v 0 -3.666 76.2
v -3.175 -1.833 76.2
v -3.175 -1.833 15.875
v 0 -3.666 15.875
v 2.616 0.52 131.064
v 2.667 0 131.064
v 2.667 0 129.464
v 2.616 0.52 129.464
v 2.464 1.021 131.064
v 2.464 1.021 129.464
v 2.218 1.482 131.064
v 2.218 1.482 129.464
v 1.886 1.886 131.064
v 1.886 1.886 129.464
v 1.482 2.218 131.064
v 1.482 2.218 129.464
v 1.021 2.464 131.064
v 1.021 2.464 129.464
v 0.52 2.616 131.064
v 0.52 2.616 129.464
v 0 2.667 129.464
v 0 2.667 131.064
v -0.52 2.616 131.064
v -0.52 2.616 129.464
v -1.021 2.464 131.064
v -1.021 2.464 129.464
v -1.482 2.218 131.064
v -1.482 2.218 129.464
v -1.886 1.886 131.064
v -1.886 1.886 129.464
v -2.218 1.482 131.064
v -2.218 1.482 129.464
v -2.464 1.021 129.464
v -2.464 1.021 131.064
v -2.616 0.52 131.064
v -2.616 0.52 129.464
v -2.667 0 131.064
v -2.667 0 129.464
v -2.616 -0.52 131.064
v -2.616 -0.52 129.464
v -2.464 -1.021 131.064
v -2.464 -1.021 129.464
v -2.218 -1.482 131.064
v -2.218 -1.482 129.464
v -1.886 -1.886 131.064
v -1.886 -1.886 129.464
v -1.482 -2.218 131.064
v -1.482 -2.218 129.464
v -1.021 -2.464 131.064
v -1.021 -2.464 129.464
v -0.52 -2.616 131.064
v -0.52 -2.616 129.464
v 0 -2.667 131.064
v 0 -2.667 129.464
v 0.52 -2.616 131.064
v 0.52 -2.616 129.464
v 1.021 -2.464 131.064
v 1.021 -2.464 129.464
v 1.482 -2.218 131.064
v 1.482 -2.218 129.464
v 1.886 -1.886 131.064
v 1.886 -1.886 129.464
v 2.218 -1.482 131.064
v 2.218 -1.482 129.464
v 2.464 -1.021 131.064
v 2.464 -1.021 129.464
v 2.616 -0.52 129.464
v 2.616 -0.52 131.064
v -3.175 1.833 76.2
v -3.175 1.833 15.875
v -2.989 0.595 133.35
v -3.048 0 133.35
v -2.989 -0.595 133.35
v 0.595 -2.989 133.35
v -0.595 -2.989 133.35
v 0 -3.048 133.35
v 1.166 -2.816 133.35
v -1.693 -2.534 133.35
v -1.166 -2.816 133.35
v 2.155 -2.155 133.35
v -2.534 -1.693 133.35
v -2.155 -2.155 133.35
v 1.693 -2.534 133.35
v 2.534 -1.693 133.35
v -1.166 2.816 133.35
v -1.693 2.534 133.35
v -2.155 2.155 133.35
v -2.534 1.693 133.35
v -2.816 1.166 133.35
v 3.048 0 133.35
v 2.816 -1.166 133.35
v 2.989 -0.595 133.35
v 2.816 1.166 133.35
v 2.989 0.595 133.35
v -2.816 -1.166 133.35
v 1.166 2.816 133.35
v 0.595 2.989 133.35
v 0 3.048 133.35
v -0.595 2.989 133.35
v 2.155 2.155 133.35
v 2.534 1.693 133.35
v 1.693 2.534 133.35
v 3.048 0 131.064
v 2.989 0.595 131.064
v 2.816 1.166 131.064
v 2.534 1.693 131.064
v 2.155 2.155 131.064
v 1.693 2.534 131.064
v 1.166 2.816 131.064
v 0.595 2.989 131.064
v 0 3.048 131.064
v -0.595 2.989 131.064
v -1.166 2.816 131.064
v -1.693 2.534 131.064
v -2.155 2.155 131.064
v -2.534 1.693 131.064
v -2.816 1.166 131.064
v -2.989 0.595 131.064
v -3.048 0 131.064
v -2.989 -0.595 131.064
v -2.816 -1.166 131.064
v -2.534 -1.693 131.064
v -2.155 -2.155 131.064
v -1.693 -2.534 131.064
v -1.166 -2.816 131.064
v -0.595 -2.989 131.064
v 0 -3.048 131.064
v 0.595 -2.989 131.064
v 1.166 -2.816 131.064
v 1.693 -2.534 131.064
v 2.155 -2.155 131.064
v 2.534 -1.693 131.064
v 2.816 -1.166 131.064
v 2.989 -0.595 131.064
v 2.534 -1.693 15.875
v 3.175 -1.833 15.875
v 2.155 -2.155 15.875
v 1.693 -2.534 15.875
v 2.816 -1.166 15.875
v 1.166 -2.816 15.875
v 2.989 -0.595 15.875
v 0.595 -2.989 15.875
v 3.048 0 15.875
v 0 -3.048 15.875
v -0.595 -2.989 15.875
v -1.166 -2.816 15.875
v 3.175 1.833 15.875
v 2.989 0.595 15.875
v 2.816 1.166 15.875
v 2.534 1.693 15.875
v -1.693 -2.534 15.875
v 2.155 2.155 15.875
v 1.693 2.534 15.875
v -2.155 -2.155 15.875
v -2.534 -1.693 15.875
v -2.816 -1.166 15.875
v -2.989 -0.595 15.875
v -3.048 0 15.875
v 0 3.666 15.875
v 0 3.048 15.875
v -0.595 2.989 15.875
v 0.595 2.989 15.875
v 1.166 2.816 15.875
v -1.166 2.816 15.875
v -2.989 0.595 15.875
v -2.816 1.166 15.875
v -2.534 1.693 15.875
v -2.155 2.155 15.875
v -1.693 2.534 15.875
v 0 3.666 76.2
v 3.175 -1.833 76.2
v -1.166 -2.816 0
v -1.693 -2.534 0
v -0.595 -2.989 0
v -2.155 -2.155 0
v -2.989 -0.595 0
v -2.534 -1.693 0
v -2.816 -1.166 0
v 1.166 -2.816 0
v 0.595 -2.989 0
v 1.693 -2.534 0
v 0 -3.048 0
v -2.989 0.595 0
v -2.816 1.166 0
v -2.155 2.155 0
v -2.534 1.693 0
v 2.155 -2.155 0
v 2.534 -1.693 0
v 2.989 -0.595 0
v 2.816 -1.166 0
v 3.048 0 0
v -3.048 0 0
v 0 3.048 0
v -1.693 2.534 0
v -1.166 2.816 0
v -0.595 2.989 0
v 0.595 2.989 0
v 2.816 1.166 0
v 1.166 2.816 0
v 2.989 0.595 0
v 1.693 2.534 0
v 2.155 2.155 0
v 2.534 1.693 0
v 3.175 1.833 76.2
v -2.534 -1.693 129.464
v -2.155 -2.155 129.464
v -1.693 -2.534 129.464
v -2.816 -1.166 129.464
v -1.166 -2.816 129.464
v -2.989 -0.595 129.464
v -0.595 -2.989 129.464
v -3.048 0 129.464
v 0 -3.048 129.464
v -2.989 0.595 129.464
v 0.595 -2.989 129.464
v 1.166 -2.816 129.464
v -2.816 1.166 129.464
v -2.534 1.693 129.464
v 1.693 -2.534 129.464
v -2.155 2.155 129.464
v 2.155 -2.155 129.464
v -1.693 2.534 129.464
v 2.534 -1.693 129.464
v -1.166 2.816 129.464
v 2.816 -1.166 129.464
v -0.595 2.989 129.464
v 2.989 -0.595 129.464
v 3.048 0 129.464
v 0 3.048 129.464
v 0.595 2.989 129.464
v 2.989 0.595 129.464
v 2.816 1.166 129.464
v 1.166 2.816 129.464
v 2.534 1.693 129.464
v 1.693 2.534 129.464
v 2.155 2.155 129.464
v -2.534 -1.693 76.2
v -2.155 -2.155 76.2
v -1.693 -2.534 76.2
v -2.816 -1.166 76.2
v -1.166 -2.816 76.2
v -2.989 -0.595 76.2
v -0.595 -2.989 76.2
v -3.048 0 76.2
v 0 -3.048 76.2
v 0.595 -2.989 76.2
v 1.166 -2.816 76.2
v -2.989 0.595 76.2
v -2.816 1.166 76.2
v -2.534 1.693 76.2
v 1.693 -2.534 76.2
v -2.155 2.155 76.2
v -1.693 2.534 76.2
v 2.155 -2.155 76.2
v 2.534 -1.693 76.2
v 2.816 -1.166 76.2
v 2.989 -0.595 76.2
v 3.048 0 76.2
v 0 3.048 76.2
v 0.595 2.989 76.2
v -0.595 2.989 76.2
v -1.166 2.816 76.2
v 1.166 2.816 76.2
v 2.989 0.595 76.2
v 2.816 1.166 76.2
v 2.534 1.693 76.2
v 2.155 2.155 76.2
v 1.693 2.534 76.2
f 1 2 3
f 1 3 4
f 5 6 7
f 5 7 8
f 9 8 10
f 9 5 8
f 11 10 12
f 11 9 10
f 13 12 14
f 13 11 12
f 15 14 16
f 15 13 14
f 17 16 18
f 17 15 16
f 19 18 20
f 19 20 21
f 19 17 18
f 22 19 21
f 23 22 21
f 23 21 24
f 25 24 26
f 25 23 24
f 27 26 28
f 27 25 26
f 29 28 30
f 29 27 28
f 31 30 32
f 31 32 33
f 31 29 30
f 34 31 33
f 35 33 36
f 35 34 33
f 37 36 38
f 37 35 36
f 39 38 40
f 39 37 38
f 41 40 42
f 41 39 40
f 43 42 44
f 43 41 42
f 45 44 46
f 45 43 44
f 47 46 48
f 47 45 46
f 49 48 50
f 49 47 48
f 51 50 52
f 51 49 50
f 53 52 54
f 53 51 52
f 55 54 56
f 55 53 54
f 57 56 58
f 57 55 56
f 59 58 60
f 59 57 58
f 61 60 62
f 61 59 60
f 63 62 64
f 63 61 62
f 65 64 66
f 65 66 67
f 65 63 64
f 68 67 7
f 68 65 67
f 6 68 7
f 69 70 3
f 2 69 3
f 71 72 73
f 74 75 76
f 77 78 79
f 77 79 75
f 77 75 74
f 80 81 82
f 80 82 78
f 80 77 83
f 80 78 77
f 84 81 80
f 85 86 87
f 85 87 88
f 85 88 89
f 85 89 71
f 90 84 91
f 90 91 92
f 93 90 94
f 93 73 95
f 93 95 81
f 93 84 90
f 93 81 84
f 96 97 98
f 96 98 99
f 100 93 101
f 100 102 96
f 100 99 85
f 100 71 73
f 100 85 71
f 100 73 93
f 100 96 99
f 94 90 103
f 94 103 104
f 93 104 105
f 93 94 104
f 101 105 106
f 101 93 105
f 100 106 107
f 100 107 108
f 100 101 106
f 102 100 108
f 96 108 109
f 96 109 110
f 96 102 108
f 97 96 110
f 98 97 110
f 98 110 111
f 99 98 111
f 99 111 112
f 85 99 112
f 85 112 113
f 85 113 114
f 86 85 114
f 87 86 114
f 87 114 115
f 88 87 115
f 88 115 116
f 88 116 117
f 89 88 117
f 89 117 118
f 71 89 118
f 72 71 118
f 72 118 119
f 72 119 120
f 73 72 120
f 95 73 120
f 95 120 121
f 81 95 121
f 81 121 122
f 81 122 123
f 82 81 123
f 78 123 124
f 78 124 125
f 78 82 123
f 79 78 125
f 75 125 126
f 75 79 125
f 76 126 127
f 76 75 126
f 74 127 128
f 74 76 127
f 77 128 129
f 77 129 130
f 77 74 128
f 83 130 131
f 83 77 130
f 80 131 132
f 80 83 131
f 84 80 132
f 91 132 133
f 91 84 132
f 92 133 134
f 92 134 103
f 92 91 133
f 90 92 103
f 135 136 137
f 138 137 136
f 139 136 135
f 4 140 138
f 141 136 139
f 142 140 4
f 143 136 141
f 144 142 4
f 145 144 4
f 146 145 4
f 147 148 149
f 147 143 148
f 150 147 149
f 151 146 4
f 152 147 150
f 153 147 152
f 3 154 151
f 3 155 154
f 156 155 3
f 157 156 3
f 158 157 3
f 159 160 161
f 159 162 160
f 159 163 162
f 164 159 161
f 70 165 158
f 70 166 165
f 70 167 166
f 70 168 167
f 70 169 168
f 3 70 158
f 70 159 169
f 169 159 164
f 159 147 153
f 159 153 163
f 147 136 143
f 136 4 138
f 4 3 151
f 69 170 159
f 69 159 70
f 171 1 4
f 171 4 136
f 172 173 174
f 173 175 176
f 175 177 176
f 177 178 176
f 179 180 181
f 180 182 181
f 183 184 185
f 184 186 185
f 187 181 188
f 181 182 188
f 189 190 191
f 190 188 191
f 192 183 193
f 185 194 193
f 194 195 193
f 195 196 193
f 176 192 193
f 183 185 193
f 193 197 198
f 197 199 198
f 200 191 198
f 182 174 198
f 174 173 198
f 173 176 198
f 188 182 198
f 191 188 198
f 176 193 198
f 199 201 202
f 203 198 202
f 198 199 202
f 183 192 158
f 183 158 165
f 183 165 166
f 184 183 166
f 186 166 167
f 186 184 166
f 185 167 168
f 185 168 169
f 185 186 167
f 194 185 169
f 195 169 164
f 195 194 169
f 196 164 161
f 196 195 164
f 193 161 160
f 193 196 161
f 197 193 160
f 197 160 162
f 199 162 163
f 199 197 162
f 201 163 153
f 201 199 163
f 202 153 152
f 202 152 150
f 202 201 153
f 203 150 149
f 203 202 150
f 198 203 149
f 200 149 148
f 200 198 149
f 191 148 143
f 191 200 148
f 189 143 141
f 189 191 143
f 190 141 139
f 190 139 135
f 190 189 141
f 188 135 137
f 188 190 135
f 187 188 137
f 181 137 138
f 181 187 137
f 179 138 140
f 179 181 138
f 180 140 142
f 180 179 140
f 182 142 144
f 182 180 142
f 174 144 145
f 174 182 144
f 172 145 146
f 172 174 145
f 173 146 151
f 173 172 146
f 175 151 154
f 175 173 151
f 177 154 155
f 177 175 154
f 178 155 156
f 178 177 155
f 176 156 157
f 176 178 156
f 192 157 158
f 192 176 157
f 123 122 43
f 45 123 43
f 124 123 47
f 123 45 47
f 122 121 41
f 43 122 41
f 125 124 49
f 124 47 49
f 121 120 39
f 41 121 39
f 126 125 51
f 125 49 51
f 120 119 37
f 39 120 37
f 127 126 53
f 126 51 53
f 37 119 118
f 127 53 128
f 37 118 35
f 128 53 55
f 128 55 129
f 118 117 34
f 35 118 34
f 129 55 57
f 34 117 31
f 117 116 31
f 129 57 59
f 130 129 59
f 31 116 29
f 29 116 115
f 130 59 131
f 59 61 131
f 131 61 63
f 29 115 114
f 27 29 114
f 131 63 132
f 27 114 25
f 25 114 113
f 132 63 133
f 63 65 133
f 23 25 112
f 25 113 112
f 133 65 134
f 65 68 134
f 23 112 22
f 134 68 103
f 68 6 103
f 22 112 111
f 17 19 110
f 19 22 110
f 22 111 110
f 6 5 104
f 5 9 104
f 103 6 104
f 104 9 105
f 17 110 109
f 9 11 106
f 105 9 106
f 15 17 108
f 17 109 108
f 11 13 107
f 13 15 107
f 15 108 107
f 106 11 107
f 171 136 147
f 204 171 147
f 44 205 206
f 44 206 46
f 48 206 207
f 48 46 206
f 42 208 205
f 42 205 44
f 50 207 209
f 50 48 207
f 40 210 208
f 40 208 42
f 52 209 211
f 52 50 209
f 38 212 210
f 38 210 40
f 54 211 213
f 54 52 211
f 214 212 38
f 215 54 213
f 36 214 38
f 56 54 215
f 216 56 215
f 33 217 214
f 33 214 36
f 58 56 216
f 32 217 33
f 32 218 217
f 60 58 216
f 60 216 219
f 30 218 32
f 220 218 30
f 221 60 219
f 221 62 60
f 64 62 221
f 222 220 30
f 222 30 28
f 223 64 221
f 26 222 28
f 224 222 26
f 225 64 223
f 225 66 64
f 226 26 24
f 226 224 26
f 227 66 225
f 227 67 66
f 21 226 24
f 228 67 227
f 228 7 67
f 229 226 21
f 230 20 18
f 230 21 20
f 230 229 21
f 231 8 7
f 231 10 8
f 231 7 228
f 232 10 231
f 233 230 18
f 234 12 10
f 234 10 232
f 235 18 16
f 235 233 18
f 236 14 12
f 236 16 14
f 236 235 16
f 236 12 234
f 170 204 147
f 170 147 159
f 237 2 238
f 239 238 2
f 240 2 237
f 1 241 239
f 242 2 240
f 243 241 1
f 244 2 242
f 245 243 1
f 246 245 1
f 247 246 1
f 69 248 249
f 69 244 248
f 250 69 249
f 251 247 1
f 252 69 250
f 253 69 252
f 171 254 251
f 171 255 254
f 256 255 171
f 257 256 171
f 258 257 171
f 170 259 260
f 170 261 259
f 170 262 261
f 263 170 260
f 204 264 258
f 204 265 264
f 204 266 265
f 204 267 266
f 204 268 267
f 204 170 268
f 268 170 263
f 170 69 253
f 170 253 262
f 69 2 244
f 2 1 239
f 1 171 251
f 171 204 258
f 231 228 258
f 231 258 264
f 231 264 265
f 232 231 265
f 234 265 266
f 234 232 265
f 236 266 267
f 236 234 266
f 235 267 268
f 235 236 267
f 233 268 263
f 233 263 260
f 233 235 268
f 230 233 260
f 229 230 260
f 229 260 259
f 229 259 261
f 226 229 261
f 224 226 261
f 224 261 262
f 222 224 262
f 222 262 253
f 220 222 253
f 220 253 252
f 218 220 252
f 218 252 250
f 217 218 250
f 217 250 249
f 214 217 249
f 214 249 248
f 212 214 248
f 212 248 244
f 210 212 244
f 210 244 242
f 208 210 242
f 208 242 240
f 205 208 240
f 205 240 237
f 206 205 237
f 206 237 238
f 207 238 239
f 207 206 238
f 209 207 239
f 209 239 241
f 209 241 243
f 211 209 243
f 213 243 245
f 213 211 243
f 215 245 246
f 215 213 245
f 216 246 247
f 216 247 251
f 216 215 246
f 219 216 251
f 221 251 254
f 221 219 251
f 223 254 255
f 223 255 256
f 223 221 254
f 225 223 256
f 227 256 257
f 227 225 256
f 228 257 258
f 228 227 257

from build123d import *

# Parameters (mm, degrees)
BOSS_EXTRUDE1_DEPTH = 133.35
SKETCH3_OUTSIDE_W   = 35.09
SKETCH3_OUTSIDE_H   = 36.072
SKETCH3_OUTSIDE_R   = 3.048
CUT_EXTRUDE1_DEPTH  = 57.15
SKETCH4_OUTSIDE_W   = 35.09
SKETCH4_OUTSIDE_H   = 36.072
SKETCH4_OUTSIDE_R   = 3.048
CUT_EXTRUDE2_DEPTH  = 15.875
SKETCH5_OUTSIDE_W   = 35.09
SKETCH5_OUTSIDE_H   = 36.072
SKETCH5_OUTSIDE_R   = 2.667
CUT_EXTRUDE3_DEPTH  = 1.6002


with BuildPart() as part:
    # Sketch2 → Boss-Extrude1 (new body)
    with BuildSketch(Plane.XY):
        Polygon((0, 3.666174209), (-3.175, 1.833087105), (-3.175, -1.833087105), (0, -3.666174209), (3.175, -1.833087105), (3.175, 1.833087105), align=None)
    extrude(amount=BOSS_EXTRUDE1_DEPTH)

    # Sketch3 outside → Cut-Extrude1 (cut)
    with BuildSketch(Plane.XY.offset(133.35)):
        Rectangle(SKETCH3_OUTSIDE_W, SKETCH3_OUTSIDE_H)
        Circle(SKETCH3_OUTSIDE_R, mode=Mode.SUBTRACT)
    extrude(amount=-CUT_EXTRUDE1_DEPTH, mode=Mode.SUBTRACT)

    # Sketch4 outside → Cut-Extrude2 (cut)
    with BuildSketch(Plane(origin=(0, 0, 0), x_dir=(-1, 0, 0), z_dir=(0, 0, -1))):
        Rectangle(SKETCH4_OUTSIDE_W, SKETCH4_OUTSIDE_H)
        Circle(SKETCH4_OUTSIDE_R, mode=Mode.SUBTRACT)
    extrude(amount=-CUT_EXTRUDE2_DEPTH, mode=Mode.SUBTRACT)

    # Sketch5 outside → Cut-Extrude3 (cut)
    with BuildSketch(Plane.XY.offset(131.064)):
        Rectangle(SKETCH5_OUTSIDE_W, SKETCH5_OUTSIDE_H)
        Circle(SKETCH5_OUTSIDE_R, mode=Mode.SUBTRACT)
    extrude(amount=-CUT_EXTRUDE3_DEPTH, mode=Mode.SUBTRACT)


solid = part.part
